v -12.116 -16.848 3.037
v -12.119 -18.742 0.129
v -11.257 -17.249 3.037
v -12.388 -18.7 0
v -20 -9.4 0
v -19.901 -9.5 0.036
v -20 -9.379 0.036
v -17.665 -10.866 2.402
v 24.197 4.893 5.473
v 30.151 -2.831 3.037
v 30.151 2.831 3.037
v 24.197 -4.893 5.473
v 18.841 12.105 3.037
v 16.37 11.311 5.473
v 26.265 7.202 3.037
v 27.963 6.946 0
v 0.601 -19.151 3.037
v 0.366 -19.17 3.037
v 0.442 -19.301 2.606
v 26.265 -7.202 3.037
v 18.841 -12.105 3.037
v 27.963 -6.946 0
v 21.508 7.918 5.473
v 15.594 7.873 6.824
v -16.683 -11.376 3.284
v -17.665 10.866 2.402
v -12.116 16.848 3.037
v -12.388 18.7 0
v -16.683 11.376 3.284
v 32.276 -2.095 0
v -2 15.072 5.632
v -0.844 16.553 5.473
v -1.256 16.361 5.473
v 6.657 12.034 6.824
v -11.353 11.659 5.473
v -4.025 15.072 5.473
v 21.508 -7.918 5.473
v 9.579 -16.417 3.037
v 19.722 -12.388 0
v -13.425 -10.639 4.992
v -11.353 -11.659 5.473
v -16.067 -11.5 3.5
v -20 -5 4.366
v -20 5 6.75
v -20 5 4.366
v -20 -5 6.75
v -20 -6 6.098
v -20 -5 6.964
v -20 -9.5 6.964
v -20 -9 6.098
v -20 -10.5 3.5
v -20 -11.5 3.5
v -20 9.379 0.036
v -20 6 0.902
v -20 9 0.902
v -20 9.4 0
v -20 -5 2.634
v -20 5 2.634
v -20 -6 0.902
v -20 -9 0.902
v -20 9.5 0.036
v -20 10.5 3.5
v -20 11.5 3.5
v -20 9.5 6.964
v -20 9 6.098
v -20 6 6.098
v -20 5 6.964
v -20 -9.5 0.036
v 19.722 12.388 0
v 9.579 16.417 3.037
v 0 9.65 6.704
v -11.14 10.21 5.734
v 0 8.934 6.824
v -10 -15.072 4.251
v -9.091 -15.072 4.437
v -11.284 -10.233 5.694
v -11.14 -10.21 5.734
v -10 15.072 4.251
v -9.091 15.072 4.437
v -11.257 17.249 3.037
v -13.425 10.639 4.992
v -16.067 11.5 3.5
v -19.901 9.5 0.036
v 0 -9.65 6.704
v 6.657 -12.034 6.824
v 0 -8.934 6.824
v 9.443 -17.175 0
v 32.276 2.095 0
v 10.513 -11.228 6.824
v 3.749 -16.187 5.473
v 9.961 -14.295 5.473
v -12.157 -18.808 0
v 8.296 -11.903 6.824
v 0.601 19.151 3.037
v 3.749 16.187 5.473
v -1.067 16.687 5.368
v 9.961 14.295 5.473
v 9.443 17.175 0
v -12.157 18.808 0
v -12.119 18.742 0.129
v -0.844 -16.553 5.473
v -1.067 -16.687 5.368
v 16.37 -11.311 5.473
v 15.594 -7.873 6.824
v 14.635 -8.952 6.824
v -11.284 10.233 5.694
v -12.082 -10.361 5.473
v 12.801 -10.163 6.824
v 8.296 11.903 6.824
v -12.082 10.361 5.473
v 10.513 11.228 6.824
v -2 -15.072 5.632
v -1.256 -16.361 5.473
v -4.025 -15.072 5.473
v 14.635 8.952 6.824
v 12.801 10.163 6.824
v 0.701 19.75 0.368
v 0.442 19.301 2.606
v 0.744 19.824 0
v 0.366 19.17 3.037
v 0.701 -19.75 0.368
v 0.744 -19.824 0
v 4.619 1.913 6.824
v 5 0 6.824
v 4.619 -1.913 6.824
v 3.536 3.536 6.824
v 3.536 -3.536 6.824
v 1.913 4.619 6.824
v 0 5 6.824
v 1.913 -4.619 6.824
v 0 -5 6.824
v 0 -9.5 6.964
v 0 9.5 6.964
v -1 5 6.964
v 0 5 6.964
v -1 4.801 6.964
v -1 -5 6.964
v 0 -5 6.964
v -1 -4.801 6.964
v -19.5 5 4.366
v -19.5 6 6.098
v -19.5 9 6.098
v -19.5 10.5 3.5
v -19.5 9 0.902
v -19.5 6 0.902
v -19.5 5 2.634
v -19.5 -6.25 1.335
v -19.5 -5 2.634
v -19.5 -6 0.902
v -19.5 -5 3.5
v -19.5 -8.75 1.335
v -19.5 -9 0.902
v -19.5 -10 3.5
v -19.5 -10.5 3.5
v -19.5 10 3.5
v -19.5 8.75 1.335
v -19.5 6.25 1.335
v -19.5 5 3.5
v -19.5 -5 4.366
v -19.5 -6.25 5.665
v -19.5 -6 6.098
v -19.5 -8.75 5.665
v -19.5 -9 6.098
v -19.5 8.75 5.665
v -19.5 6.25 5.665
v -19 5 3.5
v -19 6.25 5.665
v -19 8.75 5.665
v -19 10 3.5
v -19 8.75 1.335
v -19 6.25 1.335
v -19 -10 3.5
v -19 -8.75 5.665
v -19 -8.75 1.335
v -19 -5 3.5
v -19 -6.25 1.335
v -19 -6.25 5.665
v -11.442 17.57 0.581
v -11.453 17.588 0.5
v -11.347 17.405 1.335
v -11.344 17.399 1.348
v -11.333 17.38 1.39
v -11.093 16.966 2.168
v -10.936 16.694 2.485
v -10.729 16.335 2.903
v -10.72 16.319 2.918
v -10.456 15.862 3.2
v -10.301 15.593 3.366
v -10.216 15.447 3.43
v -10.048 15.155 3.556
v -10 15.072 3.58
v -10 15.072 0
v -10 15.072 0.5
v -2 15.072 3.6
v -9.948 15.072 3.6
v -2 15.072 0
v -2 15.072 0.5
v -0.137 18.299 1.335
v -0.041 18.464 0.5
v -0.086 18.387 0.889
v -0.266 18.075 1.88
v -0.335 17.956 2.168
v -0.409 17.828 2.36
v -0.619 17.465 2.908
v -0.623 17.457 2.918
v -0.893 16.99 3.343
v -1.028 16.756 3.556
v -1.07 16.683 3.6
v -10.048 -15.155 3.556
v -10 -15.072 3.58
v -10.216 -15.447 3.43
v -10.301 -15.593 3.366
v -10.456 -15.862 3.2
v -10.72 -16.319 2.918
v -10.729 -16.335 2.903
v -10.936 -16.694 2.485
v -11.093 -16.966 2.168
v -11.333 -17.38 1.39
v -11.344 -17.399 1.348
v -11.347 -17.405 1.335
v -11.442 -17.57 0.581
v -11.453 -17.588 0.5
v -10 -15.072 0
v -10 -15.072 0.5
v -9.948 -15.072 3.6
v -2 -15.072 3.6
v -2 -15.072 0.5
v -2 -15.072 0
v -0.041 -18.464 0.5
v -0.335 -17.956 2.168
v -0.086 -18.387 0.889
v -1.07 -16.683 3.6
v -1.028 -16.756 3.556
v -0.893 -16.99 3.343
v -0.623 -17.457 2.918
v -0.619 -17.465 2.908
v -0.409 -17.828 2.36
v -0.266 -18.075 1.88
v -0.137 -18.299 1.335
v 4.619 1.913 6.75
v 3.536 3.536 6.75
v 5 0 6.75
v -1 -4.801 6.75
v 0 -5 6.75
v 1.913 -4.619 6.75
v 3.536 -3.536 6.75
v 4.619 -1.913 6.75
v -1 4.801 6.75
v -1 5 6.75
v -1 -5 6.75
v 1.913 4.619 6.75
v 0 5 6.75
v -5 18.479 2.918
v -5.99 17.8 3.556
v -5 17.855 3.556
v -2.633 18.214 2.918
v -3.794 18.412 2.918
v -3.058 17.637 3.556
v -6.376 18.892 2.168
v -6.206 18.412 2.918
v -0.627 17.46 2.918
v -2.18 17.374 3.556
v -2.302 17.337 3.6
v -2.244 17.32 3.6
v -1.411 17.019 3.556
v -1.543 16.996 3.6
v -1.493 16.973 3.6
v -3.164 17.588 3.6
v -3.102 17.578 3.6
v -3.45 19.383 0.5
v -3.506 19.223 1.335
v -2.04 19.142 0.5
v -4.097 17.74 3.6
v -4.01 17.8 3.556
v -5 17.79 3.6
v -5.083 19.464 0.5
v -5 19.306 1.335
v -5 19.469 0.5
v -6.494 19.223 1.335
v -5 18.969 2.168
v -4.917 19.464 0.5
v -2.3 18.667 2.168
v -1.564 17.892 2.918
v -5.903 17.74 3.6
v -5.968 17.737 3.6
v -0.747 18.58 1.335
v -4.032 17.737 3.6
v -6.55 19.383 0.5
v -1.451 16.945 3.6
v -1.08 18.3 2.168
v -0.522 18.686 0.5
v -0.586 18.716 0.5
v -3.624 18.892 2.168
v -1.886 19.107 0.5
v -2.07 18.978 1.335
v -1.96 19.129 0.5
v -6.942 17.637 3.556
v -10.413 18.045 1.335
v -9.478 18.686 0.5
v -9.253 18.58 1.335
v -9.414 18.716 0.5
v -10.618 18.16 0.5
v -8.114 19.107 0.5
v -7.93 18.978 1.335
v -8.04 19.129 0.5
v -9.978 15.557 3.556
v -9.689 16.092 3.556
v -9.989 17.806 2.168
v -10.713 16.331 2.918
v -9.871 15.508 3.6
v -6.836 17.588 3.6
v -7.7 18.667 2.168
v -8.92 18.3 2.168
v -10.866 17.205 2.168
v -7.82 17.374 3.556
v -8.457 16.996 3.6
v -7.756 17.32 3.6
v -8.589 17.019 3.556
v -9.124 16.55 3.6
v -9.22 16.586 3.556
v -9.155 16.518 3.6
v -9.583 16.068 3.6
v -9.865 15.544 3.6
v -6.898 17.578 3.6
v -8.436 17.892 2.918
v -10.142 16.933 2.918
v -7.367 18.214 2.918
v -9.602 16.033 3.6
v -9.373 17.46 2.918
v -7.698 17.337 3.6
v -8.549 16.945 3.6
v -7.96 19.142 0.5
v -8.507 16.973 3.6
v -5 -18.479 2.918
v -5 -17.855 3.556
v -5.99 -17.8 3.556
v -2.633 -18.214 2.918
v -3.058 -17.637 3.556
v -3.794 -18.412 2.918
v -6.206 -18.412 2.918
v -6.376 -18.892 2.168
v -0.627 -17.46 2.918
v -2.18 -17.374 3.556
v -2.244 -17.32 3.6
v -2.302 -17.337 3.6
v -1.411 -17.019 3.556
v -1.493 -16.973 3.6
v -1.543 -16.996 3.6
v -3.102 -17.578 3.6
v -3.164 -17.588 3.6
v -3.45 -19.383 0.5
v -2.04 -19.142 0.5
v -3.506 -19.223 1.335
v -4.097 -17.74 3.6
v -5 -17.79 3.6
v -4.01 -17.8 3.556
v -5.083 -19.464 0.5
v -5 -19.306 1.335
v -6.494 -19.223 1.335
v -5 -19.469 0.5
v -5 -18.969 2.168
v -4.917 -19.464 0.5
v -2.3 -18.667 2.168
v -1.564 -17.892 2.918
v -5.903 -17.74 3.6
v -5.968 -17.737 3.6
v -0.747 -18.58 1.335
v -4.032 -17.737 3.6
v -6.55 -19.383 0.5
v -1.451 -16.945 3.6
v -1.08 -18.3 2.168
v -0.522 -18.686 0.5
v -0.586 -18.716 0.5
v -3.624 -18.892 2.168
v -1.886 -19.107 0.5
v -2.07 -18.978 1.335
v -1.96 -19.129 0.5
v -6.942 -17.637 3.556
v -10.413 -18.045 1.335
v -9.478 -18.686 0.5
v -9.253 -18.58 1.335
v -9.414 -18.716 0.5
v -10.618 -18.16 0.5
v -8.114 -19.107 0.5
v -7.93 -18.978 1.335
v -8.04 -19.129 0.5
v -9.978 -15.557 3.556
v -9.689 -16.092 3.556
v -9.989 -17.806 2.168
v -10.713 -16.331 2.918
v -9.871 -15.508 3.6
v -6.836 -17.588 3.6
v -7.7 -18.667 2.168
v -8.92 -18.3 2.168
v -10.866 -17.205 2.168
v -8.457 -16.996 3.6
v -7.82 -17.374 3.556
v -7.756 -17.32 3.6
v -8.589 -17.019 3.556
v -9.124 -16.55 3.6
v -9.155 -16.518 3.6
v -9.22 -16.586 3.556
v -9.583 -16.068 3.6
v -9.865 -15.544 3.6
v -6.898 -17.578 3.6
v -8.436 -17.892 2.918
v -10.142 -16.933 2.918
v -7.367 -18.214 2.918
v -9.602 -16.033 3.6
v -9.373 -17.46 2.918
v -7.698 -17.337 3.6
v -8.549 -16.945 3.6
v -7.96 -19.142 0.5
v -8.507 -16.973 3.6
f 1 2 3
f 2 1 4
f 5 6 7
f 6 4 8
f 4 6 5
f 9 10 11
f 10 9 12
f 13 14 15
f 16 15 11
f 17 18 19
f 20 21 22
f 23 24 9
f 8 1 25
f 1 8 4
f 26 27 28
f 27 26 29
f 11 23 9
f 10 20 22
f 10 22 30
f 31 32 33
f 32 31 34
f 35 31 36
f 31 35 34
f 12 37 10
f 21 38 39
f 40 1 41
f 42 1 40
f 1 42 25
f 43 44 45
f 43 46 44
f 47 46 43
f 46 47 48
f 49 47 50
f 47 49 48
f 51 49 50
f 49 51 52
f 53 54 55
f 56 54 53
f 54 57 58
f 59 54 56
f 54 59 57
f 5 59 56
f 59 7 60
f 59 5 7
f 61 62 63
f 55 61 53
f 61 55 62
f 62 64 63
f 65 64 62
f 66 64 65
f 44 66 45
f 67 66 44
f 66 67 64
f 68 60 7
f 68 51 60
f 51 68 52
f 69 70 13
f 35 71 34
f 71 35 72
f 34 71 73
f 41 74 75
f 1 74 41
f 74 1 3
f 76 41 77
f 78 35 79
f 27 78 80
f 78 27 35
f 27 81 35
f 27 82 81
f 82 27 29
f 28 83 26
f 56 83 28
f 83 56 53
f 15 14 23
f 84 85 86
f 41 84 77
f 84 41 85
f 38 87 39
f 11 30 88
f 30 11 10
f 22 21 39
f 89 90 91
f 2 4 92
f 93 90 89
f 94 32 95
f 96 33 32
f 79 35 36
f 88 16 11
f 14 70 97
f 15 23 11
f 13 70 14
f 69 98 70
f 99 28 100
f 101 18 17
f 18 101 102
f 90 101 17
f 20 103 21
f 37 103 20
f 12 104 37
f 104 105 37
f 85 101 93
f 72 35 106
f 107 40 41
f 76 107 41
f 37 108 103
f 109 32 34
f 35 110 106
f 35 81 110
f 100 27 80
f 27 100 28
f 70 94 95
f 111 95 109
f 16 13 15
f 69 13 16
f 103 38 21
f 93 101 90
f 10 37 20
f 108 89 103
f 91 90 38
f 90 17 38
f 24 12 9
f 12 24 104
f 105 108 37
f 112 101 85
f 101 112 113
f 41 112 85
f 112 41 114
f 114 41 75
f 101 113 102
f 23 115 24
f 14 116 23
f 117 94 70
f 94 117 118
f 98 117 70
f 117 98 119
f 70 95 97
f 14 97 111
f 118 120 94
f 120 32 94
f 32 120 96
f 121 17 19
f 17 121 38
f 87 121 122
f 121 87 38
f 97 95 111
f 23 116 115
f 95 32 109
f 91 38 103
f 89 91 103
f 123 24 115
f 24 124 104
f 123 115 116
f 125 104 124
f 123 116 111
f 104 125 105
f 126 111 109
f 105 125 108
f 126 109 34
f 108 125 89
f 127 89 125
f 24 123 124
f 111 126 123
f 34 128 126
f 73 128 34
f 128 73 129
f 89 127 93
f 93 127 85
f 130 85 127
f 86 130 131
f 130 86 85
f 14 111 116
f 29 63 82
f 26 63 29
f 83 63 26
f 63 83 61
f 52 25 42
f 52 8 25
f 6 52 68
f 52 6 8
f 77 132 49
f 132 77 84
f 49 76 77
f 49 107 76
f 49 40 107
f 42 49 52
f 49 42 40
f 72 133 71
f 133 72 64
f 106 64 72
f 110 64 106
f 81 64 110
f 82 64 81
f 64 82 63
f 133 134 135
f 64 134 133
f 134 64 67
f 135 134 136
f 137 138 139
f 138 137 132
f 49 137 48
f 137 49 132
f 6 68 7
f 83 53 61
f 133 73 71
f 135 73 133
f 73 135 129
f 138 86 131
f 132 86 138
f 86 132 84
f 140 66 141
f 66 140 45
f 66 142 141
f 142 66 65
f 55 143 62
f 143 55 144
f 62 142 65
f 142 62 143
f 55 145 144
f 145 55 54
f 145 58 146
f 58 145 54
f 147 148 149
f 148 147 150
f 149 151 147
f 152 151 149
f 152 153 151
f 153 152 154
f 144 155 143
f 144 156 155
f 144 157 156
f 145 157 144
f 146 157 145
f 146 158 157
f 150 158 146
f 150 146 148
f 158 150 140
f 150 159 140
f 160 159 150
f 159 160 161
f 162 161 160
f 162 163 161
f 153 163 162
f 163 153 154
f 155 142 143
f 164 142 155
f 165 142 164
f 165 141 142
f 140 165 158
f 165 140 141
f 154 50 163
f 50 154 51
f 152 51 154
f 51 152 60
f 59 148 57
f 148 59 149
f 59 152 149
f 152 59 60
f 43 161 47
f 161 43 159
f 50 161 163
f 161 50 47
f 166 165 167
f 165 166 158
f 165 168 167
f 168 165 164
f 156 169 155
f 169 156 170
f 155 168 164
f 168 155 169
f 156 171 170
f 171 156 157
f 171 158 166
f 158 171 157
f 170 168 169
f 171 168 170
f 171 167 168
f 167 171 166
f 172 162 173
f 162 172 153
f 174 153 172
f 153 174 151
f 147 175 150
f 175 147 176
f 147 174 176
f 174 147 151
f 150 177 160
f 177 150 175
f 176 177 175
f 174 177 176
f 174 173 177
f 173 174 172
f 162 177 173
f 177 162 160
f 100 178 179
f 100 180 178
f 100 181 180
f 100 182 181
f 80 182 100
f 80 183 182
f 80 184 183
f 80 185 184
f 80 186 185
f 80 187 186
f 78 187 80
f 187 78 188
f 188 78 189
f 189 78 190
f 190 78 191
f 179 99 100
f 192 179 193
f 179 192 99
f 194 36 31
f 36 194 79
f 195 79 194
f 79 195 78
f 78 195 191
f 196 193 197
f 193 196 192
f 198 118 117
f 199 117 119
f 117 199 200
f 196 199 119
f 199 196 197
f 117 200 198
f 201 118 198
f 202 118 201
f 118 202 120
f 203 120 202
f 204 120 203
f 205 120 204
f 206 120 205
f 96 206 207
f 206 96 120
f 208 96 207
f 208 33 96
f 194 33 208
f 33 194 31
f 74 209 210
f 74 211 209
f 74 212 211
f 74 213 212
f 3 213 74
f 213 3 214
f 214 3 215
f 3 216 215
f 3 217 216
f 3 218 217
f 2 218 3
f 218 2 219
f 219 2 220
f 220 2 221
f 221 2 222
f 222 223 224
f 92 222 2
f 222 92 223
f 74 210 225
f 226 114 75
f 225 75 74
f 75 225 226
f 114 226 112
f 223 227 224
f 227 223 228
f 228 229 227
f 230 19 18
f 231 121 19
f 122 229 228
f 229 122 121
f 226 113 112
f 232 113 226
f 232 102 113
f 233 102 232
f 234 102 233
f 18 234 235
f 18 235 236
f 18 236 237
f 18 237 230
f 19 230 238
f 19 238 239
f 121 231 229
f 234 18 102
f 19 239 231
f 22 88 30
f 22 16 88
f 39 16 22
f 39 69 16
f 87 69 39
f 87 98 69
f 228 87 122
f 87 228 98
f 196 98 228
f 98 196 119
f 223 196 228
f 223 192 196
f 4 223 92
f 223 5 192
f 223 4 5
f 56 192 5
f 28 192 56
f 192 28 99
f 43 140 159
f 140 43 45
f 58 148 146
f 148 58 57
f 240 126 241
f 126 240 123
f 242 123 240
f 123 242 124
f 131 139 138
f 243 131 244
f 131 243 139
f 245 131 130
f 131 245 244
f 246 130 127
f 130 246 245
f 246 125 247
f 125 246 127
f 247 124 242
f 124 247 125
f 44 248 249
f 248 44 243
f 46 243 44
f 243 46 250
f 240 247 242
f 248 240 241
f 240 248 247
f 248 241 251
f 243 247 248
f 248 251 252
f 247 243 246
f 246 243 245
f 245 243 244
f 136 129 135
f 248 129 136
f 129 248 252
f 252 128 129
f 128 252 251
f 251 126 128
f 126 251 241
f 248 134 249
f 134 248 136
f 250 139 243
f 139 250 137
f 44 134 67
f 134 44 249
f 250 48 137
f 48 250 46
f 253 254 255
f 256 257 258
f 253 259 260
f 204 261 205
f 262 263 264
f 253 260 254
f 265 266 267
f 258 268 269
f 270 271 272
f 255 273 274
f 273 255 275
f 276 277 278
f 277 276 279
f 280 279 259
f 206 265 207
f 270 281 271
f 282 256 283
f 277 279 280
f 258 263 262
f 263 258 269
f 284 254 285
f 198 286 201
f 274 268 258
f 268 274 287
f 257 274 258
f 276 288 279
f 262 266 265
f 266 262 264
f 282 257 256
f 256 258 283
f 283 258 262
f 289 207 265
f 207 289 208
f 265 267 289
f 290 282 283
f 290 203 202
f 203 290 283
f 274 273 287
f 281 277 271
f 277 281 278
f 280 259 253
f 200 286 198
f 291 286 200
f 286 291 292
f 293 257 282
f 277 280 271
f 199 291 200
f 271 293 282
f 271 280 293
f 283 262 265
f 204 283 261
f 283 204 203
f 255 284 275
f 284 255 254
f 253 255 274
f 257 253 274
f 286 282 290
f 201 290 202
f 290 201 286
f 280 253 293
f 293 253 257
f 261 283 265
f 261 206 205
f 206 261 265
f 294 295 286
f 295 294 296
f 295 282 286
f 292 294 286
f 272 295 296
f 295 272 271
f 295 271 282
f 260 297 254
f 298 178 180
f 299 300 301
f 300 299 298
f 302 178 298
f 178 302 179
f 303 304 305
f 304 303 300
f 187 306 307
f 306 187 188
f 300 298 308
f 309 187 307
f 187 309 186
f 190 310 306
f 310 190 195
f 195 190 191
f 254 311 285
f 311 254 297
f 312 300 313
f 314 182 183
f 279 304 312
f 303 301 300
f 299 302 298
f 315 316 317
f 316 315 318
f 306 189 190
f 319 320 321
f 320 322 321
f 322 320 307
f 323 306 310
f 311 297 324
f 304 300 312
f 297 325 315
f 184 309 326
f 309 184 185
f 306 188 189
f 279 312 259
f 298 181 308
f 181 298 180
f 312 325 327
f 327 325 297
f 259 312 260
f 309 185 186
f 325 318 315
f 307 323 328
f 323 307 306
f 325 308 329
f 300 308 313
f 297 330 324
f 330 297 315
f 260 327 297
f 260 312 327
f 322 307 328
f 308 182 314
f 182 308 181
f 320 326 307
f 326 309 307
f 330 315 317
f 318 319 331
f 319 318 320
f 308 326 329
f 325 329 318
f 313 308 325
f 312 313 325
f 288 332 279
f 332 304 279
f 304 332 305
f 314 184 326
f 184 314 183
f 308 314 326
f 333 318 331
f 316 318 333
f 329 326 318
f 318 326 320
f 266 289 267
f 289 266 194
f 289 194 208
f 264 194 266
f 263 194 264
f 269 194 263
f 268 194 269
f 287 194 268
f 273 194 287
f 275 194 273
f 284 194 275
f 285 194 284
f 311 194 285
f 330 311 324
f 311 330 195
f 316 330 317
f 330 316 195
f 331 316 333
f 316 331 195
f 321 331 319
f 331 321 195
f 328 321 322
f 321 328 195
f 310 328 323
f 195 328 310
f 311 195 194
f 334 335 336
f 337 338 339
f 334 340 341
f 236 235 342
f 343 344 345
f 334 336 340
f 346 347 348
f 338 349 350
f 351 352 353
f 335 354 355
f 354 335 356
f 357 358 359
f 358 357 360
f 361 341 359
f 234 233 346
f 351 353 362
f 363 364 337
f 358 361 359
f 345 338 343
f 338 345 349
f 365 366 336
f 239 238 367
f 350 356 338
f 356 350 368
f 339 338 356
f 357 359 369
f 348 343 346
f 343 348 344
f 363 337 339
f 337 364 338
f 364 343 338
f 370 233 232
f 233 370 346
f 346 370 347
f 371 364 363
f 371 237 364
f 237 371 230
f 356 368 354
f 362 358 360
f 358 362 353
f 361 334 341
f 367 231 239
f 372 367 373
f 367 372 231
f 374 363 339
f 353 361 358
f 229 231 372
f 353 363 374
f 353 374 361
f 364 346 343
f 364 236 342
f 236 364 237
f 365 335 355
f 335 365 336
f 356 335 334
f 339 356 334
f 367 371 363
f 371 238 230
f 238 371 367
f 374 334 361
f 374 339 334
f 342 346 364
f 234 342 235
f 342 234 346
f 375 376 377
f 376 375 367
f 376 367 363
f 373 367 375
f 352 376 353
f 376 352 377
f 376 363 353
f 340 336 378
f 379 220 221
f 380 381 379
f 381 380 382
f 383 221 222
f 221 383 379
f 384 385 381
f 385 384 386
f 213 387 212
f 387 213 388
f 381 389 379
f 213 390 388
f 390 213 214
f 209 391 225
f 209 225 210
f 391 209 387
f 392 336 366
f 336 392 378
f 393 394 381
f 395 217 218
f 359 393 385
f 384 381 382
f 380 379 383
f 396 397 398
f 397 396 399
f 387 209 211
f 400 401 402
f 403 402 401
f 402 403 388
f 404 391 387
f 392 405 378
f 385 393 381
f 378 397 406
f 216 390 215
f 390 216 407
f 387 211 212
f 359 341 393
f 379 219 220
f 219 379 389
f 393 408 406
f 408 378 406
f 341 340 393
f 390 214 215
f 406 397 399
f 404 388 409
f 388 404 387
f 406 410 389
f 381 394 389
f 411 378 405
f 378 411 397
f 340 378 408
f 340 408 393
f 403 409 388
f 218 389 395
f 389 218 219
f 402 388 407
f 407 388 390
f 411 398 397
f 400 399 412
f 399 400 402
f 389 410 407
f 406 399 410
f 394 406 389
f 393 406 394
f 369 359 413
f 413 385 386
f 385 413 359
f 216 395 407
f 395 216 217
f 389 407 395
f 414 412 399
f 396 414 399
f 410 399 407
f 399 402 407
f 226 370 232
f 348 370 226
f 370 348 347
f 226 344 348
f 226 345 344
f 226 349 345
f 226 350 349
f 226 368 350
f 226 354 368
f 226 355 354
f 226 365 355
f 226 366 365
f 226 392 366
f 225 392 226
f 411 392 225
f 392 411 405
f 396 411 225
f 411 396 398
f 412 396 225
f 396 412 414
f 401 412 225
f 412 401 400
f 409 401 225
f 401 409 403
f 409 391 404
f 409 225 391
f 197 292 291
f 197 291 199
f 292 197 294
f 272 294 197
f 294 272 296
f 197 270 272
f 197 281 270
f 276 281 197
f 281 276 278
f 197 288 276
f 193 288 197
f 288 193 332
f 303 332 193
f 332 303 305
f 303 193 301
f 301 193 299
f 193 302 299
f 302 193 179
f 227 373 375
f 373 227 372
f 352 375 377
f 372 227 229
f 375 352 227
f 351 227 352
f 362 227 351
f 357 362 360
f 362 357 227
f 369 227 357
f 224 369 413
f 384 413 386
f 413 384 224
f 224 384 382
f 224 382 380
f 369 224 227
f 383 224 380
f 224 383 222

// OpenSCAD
// file: ../macs/macs.scad
use <../lib/util.scad>;

module macs_pod_small() {
    difference() {
        scale([.5,.4,.35])
            rotate(90)
                sphere(6, $fn=6);
        macs_pod_diff();
    }
}

module macs_pod_diff() {
    translate([0,0,-(6+.5)])
        cube(12, center=true);

    translate([-(3+1.25),0,0])
        cube(6, center=true);
}

module macs_pod() {
    difference() {
        scale([1,.4,.35])
            rotate(90)
                sphere(6, $fn=6);
        macs_pod_diff();
    }
    
    //macs_pod_wing();
}

module macs_small_nacelle() {
    util_nacelle(7.5,1,1,curved=true, up=false);
}


module macs_pod_wing() {
    translate([-1,0,0])
        rotate([0,90,0])
            scale([.1,1,1])
                cylinder(2, 3.5, 2.75, $fn=6);
}

module macs_small_warp() {
    macs_corridor(4);

    translate([0,0,1.5])
        mirror([0,0,1])
            scale([1,1.2,0.8])
                util_nacelle_bar(7.5,2,2,.15);

    util_mirrored([0,1,0])
        translate([3,4.2,0])
            macs_small_nacelle();
    
    translate([0,0,1.5])
        rotate([0,90,0]) {
            translate([0,0,1.5]) sphere(.5, $fn=8);
            cylinder(3,.5,.5, center=true, $fn=8);
            translate([0,0,-1.5]) sphere(.5, $fn=8);
        }
}




module macs_extra_room() {
     macs_corridor(8);

     difference() {
         scale([1,1,.5])
            sphere(4, $fn=6);


        translate([0,0,-(6+.5)])
            cube(12, center=true);
    }
}

module macs_tactical_warp() {
    translate([0,0,0])
    macs_corridor(8);

    difference() {
        translate([0,0,-.5+1.2])
        cylinder(h=2.4,r1=8,r2=5,center=true,$fn=3);

        translate([4+3,0,0])
        cube(8, center=true);
    }

    util_mirrored([0,1,0])
    translate([-1.5,4,-.5+.6])
    scale([2.5,1,1])
    difference() {
        rotate(45/2)
        cylinder(h=1.2,r1=3,r2=2,center=true, $fn=8);
        
        translate([0,-3.5,0])
        rotate([-20,0,0])
        cube(7,center=true);
    }
}





module macs_corridor(length) {
    difference() {
        scale([1,1,.9])
            rotate([0,-90,0])
                rotate(90)
                    cylinder(length,2,2,$fn=6, center=true);
        translate([0,0,-(length*1.1/2 +.5)])
            cube(length*1.1, center=true);
    }
}

module macs_large_nacelle() {
    util_nacelle(23,2.5,2.5,curved=true,up=false);
}

module macs_large_warp(up=false) {
    macs_corridor(16);
    scale(1.5) macs_corridor(4);
    translate([0,0,.5]) {
        if(up) {
            util_nacelle_bar(25,2.5,2,.5);
        }
        else {
            mirror([0,0,1]) util_nacelle_bar(25,2.5,2,.5);
        };
    };
    
    if (up) {
        util_mirrored([0,1,0]) 
            translate([4,11,2.5]) 
                rotate([105,0,0])
                    macs_large_nacelle();
    } else {
        util_mirrored([0,1,0]) 
            translate([4,11,-2]) 
                rotate([75,0,0])
                    macs_large_nacelle();
    };
}



module macs_box() {
    scale([1,1.5,.5]) {
        rotate([0,90,0])
            rotate(180/8)
                cylinder(8,4,4, $fn=8, center=true);

        util_mirrored([1,0,0])
            translate([4,0,0])
                rotate([0,90,0])
                    rotate(180/8)
                        sphere(4, $fn=8);
    }
}



module macs_double_box() {
    union() {
        translate([-7,0,0]) macs_box();
        translate([7,0,0]) macs_box();
    }
}


module macs_disk(radius) {
    util_hangar_form(radius*2,radius*2,2,4,3) union () {
        translate([0,0,2]) cylinder(0.25, radius, radius-.5, center=true);
        cylinder(3.5, radius, radius, center=true);
        translate([0,0,-2]) cylinder(0.25, radius-.5, radius, center=true);
    }
    cylinder(4.5, 3,3, center=true);
}


module macs_cargo_element() {
    rotate([0,90,0]) scale([1,1,2]) macs_disk(6);
}

module macs_large_cargo() {
    translate([28,0,0]) macs_cargo_element();
    translate([20,0,0]) macs_cargo_element();
    translate([12,0,0]) macs_cargo_element();
    translate([4,0,0]) macs_cargo_element();
    translate([-4,0,0]) macs_cargo_element();
    translate([-12,0,0]) macs_cargo_element();
    translate([-20,0,0]) macs_cargo_element();
    translate([-28,0,0]) macs_cargo_element();

    translate([20,0,0]) cylinder(6.6,3,3);
    translate([-20,0,0]) cylinder(6.6,3,3);
}

    
// file: ../combined/multilib.scad
use <../mother/mlib.scad>;

module repeat(num, tv=[0,0,0], rv=[0,0,0]) {
    for(x = [0:1:num-1  ]) {
        rotate(rv*x) translate(tv*x)  children();
    }
}
// file: icp.scad
use <../lib/util.scad>;

module icp_saucer_large(extend=false) {
    difference() {
        util_saucer(80,40,10);

        if (extend == false) {
            translate([-50,0,0])
                rotate([0,15,0])
                    cube(80,center=true);
        }

        util_mirrored([0,1,0])
            translate([-40,55,-1])
                rotate([-30,0,0])
                    cube(80,center=true);
            
        translate([40,0,0])
            rotate([0,30,0])
                cube(10,center=true);

        translate([35,0,6.4])
            rotate([0,-65,0])
                cube([5,5,7.5],center=true);

    }
}

module icp_saucer_large_2(faces=32) {
    difference() {
        util_ovoid(40,40,40,10,10,faces=faces);
        
        translate([0,0,-50])
        cube(100,center=true);

        translate([-50,0,0])
            rotate([0,15,0])
                cube(80,center=true);

        util_mirrored([0,1,0])
            translate([-40,55,-1])
                rotate([-30,0,0])
                    cube(80,center=true);
            
        translate([40,0,0])
            rotate([0,30,0])
                cube(10,center=true);

        translate([35,0,6.4])
            rotate([0,-65,0])
                cube([5,5,7.5],center=true);

    }
}

module tactical_shuttle() {
    difference() {
        util_saucer(9,9,2.25);

        translate([3,0,2])
            rotate([0,-66,0])
                cube([1.5,1.5,3],center=true);
    }

    translate([-3.5,0,1])
        scale([1,1,.5])
            rotate([90,0,0])
                cylinder(5,2,2,$fn=6,center=true);

    util_mirrored([0,1,0])
        translate([-4,1.5,1])
            rotate([90,0,0])
                util_nacelle(7.5,1,4,curved=true,up=false);
};


module runabout_old() {
    difference() {
        util_saucer(18,15,3);

        translate([6,0,3.3])
            rotate([0,-72,0])
                cube([3,3,5],center=true);
    }

    translate([-7.5,0,0])
        scale([1,1,.4])
            rotate([90,0,0])
                cylinder(9,4,4,$fn=6,center=true);

    translate([-7.5,0,1])
        mirror([0,0,1])
            util_nacelle_bar(15,2.5,2.5,.5);

    util_mirrored([0,1,0])
        translate([-3,6.5,-2])
            scale([1,1,.5])
                union() {
                    rotate([0,90,0])
                        cylinder(14,1.5,1.5,center=true,$fn=16);

                    util_mirrored([1,0,0])
                        translate([7,0,0])
                            sphere(1.5,$fn=16);
                }
}

module yacht() {
    difference() {
        util_saucer(27,27,3.5);

        translate([10,0,3])
            rotate([0,-75,0])
                cube([3,3,5],center=true);
    }

    translate([-13,0,0]) {

        difference(){
            mirror([0,0,1])
                util_saucer(16,8,2.5);

            translate([-4,0,-2.5])
                scale([1.5,1,1])
                    rotate([90,0,0])
                        cylinder(10,2.5,2.5,center=true,$fn=16);
            
            translate([-9,0,-5])
                cube(10,center=true);
            
            translate([7.5,0,-1.25])
                rotate([0,90,0])
                    cylinder(4,.5,1,$fn=16, center=true);
        }

        util_saucer(16,8,1.5);
    }

    translate([-11,0,0])
        difference() {
            util_nacelle_bar(25,2.5,27,.25);
            
            translate([-29.5,0,0])
                cylinder(40,20,20,center=true);

            util_mirrored([0,1,0])
                translate([11,25,0])
                    cylinder(40,25,25,center=true);
        }

    util_mirrored([0,1,0])
        translate([-14,11,2.5])
            util_nacelle(20,4,2,curved=true);
}


module science_runabout() {
    difference() {
        util_saucer(36,36,4);

        translate([15,0,3])
            rotate([0,-75,0])
                cube([3,3,5],center=true);
    }

    translate([-13,0,0]) difference() {
        scale([1.5,1,1.2])
            rotate([90,0,0])
                cylinder(15,4,4,$fn=6,center=true);
        
        translate([0,0,-10]) cube(20,center=true);
    }
    
    translate([-15,0,1])
        util_nacelle_bar(28,2.5,3,.5);
    
    util_mirrored([0,1,0])
        translate([-8,12,3])
            util_nacelle(24,4,2,curved=true);
}


module attack() {
    difference() {
        util_saucer(45,45,5);

        translate([20,0,3])
            rotate([0,-70,0])
                cube([3,3,5],center=true);
        
    }

    difference() {
        scale([1,1,2.5])
            util_body(45,45,1.5,6);
    
        translate([22.5,0,-1.2])
            sphere(1,$fn=16);
    }

    util_mirrored([0,1,0])
        translate([-12,12,-2.5])
            rotate([75,0,0])
                util_nacelle(40,5,12,curved=true,up=false);

    difference() {
        translate([-10,0,0])
            mirror([0,0,1])
                util_nacelle_bar(35,3.2,20,2);

        util_mirrored([0,1,0])
            translate([2,18,0])
                cylinder(15,15,15,center=true);
        
        translate([-38,0,0]) cylinder(15,22.5,22.5,center=true);
    }
}

module scout_old() {
    difference() {
        util_saucer(54,54,5);

        translate([24,0,3])
            rotate([0,-70,0])
                cube([3,3,5],center=true);
    }

    translate([-36,0,0]) 
    scale([1.33,.66,1]) {
        difference() {
            cylinder(8,8,32,center=true,$fn=4);
            translate([-35,0,0])
                cube(60,center=true);
        }

        difference() {
            cylinder(8,54,32,center=true,$fn=4);
            translate([-35,0,0])
                cube([60,200,60],center=true);
            translate([35,0,0])
                cube([60,200,60],center=true);
            translate([0,0,-60])
                cube(120,center=true);
        }
    }

    util_mirrored([0,1,0])
        translate([-24,24,1.5])
            rotate([-110,0,0])
                util_nacelle(45,4,8,curved=true);

    translate([0,0,.1])
    util_nacelle(42,32,6.7,curved=true);
}

module icp_large_saucer_common() {
    difference() {
        util_ovoid(45,45,90,5,2);
        translate([45,0,0])
        cube(16,center=true);
    }

    translate([-55,0,0]) {

        difference() {
            util_ovoid(75,25,20,8,10);
            translate([20,0,-10])
            scale([2,1,1])
            rotate([90,0,0])
            cylinder(h=45,r=10,center=true);

            translate([35+20,0,-35])
            cube(70,center=true);
        }
    }

    util_ovoid(
        9,60,18,8,1);

    util_ovoid(
        18,18,36,8,1);

}
// file: ../lib/util.scad
fn1 = 32;
fn2 = 16;

module util_half_sphere(radius, fn=fn1) {
    difference() {
        sphere(radius, $fn=fn);
        translate([0,0,-(radius+radius/19)])
            cube(2*radius+radius/10, center=true);
    }
}

function gcd(a,b) = a == b ? a : a > b ? gcd(a-b, b) : gcd(a, b-a);

module util_saucer(length, width, height, fn=fn1) {
    rad = gcd(length,gcd(width,height));
    //rad = 10;
    scale([length/(2*rad), width/(2*rad), height/rad])
        util_half_sphere(rad, fn);
}

module util_half_cylinder(length, radius, inner_fn=fn2, outer_fn=fn1) {
    maxval = max(length, 2*radius);
    intersection() {
        difference() {
            rotate([0,90,0])
                translate([0,0,-(length/2 + length/20)])
                    cylinder(length+length/10, radius, radius, $fn=inner_fn);
            
            translate([0,0,(maxval/2 + maxval/19)])
                cube(maxval+maxval/10, center=true);
        }
        
        translate([0,0,-(radius+radius/20)])
            cylinder(radius + radius/10, length/2, length/2, $fn=outer_fn);
    }
}

module util_body(length, width, height, upper_height, fn=fn1) {
    rad = gcd(length, gcd(width, upper_height));
    
    scale(.995) scale([length/(2*rad), width/(2*rad), 1])
        util_half_cylinder(2*rad, height, outer_fn=fn);
}

module util_graded_cylinder(height, radius_start, radius_end, grades=1, fn=fn1) {
    height_grade = height / grades;
    radius_grade = (radius_start - radius_end) / (grades * grades);
    for (i = [0 : 1 : grades]) {
        translate([0,0,i*height_grade])
            cylinder(height_grade, 
                     radius_start - i*radius_grade * i,
                     radius_start - (i+1) * radius_grade * (i+1),
                     $fn = fn);
    }
}

module util_nacelle(length, width, height, curved=false, up=true, front_bulge=false) {
    rad = min(width, height/2);
    grads = curved ? 6 : 1;
    scale_factor = front_bulge ? 1.1 : 1;
    direction = up ? -1 : 1;
    difference() {
        scale([1, width/ (2*rad), height/rad])
            difference() {
                union() {
                    rotate([0,-90,0])
                        rotate(30)
                            util_graded_cylinder(length-rad, rad, rad/2, grads, 6);
                    scale(scale_factor) 
                        rotate([0,90,0]) rotate(90) sphere(rad, $fn=6);
                }
                
                translate([-length/2, 0, direction * (height/2 + height/19)])
                    cube([length+length, width+width, height+height/10], center=true);
            }
        
        translate([-length-(curved?length/3:0), 0, -length/3])
            rotate([0,-45,0])
                cube(length, center=true);
    }
}

module util_mirrored(v) {
    children();
    mirror(v) children();
}

module util_ring(outer, inner, height) {
    difference() {
        translate([0,0,-height/2])
            cylinder(height, outer, outer);
        translate([0,0,-(height/2 + height/19)])
            cylinder(height+height/10, inner, inner);
    }
}

module util_star(radius, thick, num, half=false) {
    angle = 360/num;
    offset = half? angle/2 : 0;
    for (i = [0: 1: num]) {
        rotate(i* angle + offset)
            translate([radius/2,0,0])
                cube([radius, thick, thick], center=true);
    }
}

module util_ring_star(radius, thick, num, inner, half=false) {
    outer=inner+thick;
    avg = (inner + outer)/2;
    union() {
        difference() {
            util_star(radius, thick, num, half);
            cylinder(2*thick, outer, outer, $fn=num, center=true);
        }
        util_ring(outer, inner, thick);
    }
}

module util_hangar_disk(height, lower, upper, num, fn=fn1) {
    difference() {
            cylinder(height, lower, upper, $fn=fn, center=true);
        difference() {
            scale([1,1,22])
                util_star(1.1*upper, height/20, num, half=true);
            scale(.95)
                cylinder(height, lower, upper, $fn=fn, center=true);
        }
    }
}

module util_hangar_form(length, width, height, num, inner=0) {
    l = 0.6* max(length, width);
    h = 2.5* height;
    thick = min(height/20,1);
    inner = inner == 0 ? l/3 : inner;
    difference() {
        children();
        scale([1,1,h/thick]) 
            util_ring_star(l, thick, num, inner, half=true);
    }
    scale(.95) children();
}

module util_nacelle_bar(span, height, width, thickness) {
    rad = (span*span/(8*height) + height/2);
    outer = rad + thickness/2;
    inner = rad - thickness/2;
    difference(){
        translate([0,0,outer])
            rotate([0,90,0])
                util_ring(outer, inner, width);
    
        translate([0,0,1.1*outer+height])
            cube(2.2*outer, center=true);
    }
}

module util_q_sphere(rad, quadrant, faces) {
    x_sign = quadrant == 1 ? 1 :
             quadrant == 2 ? -1 :
             quadrant == 3 ? -1 :
             quadrant == 4 ? 1 : 0;
    z_sign = quadrant == 1 ? 1 :
             quadrant == 2 ? 1 :
             quadrant == 3 ? -1 :
             quadrant == 4 ? -1 : 0;
    
    difference() {
        sphere(rad, $fn=faces);

        translate([x_sign*(-1.1*rad - .01),0,0])
        cube(2.2*rad, center=true);

        translate([0,0,z_sign*(-1.1*rad - .01)])
        cube(2.2*rad, center=true);
    }
}

module util_ovoid(front_rad, back_rad, width, upper_rad, lower_rad, faces=32) {
    half_width = width/2;
    largest=max(front_rad, back_rad, half_width, upper_rad, lower_rad);
    smallest=min(front_rad, back_rad, half_width, upper_rad, lower_rad);
    
    union() {
        scale([front_rad/smallest, half_width/smallest, upper_rad/smallest])
        util_q_sphere(smallest, 1, faces);
        
        scale([front_rad/smallest, half_width/smallest, lower_rad/smallest])
        util_q_sphere(smallest, 4, faces);
        
        scale([back_rad/smallest, half_width/smallest, lower_rad/smallest])
        util_q_sphere(smallest, 3, faces);
        
        scale([back_rad/smallest, half_width/smallest, upper_rad/smallest])
        util_q_sphere(smallest, 2, faces);
    }
}
// main file
use <../lib/util.scad>;
use <icp.scad>;
use <../aux/hulls.scad>;

module science_old() {
    icp_saucer_large();

    util_mirrored([0,1,0])
    translate([0,14,.75])
    util_ovoid(25,15,10,5,5,faces=7);

}

module science() {
    heavy_hull();
}

science();
